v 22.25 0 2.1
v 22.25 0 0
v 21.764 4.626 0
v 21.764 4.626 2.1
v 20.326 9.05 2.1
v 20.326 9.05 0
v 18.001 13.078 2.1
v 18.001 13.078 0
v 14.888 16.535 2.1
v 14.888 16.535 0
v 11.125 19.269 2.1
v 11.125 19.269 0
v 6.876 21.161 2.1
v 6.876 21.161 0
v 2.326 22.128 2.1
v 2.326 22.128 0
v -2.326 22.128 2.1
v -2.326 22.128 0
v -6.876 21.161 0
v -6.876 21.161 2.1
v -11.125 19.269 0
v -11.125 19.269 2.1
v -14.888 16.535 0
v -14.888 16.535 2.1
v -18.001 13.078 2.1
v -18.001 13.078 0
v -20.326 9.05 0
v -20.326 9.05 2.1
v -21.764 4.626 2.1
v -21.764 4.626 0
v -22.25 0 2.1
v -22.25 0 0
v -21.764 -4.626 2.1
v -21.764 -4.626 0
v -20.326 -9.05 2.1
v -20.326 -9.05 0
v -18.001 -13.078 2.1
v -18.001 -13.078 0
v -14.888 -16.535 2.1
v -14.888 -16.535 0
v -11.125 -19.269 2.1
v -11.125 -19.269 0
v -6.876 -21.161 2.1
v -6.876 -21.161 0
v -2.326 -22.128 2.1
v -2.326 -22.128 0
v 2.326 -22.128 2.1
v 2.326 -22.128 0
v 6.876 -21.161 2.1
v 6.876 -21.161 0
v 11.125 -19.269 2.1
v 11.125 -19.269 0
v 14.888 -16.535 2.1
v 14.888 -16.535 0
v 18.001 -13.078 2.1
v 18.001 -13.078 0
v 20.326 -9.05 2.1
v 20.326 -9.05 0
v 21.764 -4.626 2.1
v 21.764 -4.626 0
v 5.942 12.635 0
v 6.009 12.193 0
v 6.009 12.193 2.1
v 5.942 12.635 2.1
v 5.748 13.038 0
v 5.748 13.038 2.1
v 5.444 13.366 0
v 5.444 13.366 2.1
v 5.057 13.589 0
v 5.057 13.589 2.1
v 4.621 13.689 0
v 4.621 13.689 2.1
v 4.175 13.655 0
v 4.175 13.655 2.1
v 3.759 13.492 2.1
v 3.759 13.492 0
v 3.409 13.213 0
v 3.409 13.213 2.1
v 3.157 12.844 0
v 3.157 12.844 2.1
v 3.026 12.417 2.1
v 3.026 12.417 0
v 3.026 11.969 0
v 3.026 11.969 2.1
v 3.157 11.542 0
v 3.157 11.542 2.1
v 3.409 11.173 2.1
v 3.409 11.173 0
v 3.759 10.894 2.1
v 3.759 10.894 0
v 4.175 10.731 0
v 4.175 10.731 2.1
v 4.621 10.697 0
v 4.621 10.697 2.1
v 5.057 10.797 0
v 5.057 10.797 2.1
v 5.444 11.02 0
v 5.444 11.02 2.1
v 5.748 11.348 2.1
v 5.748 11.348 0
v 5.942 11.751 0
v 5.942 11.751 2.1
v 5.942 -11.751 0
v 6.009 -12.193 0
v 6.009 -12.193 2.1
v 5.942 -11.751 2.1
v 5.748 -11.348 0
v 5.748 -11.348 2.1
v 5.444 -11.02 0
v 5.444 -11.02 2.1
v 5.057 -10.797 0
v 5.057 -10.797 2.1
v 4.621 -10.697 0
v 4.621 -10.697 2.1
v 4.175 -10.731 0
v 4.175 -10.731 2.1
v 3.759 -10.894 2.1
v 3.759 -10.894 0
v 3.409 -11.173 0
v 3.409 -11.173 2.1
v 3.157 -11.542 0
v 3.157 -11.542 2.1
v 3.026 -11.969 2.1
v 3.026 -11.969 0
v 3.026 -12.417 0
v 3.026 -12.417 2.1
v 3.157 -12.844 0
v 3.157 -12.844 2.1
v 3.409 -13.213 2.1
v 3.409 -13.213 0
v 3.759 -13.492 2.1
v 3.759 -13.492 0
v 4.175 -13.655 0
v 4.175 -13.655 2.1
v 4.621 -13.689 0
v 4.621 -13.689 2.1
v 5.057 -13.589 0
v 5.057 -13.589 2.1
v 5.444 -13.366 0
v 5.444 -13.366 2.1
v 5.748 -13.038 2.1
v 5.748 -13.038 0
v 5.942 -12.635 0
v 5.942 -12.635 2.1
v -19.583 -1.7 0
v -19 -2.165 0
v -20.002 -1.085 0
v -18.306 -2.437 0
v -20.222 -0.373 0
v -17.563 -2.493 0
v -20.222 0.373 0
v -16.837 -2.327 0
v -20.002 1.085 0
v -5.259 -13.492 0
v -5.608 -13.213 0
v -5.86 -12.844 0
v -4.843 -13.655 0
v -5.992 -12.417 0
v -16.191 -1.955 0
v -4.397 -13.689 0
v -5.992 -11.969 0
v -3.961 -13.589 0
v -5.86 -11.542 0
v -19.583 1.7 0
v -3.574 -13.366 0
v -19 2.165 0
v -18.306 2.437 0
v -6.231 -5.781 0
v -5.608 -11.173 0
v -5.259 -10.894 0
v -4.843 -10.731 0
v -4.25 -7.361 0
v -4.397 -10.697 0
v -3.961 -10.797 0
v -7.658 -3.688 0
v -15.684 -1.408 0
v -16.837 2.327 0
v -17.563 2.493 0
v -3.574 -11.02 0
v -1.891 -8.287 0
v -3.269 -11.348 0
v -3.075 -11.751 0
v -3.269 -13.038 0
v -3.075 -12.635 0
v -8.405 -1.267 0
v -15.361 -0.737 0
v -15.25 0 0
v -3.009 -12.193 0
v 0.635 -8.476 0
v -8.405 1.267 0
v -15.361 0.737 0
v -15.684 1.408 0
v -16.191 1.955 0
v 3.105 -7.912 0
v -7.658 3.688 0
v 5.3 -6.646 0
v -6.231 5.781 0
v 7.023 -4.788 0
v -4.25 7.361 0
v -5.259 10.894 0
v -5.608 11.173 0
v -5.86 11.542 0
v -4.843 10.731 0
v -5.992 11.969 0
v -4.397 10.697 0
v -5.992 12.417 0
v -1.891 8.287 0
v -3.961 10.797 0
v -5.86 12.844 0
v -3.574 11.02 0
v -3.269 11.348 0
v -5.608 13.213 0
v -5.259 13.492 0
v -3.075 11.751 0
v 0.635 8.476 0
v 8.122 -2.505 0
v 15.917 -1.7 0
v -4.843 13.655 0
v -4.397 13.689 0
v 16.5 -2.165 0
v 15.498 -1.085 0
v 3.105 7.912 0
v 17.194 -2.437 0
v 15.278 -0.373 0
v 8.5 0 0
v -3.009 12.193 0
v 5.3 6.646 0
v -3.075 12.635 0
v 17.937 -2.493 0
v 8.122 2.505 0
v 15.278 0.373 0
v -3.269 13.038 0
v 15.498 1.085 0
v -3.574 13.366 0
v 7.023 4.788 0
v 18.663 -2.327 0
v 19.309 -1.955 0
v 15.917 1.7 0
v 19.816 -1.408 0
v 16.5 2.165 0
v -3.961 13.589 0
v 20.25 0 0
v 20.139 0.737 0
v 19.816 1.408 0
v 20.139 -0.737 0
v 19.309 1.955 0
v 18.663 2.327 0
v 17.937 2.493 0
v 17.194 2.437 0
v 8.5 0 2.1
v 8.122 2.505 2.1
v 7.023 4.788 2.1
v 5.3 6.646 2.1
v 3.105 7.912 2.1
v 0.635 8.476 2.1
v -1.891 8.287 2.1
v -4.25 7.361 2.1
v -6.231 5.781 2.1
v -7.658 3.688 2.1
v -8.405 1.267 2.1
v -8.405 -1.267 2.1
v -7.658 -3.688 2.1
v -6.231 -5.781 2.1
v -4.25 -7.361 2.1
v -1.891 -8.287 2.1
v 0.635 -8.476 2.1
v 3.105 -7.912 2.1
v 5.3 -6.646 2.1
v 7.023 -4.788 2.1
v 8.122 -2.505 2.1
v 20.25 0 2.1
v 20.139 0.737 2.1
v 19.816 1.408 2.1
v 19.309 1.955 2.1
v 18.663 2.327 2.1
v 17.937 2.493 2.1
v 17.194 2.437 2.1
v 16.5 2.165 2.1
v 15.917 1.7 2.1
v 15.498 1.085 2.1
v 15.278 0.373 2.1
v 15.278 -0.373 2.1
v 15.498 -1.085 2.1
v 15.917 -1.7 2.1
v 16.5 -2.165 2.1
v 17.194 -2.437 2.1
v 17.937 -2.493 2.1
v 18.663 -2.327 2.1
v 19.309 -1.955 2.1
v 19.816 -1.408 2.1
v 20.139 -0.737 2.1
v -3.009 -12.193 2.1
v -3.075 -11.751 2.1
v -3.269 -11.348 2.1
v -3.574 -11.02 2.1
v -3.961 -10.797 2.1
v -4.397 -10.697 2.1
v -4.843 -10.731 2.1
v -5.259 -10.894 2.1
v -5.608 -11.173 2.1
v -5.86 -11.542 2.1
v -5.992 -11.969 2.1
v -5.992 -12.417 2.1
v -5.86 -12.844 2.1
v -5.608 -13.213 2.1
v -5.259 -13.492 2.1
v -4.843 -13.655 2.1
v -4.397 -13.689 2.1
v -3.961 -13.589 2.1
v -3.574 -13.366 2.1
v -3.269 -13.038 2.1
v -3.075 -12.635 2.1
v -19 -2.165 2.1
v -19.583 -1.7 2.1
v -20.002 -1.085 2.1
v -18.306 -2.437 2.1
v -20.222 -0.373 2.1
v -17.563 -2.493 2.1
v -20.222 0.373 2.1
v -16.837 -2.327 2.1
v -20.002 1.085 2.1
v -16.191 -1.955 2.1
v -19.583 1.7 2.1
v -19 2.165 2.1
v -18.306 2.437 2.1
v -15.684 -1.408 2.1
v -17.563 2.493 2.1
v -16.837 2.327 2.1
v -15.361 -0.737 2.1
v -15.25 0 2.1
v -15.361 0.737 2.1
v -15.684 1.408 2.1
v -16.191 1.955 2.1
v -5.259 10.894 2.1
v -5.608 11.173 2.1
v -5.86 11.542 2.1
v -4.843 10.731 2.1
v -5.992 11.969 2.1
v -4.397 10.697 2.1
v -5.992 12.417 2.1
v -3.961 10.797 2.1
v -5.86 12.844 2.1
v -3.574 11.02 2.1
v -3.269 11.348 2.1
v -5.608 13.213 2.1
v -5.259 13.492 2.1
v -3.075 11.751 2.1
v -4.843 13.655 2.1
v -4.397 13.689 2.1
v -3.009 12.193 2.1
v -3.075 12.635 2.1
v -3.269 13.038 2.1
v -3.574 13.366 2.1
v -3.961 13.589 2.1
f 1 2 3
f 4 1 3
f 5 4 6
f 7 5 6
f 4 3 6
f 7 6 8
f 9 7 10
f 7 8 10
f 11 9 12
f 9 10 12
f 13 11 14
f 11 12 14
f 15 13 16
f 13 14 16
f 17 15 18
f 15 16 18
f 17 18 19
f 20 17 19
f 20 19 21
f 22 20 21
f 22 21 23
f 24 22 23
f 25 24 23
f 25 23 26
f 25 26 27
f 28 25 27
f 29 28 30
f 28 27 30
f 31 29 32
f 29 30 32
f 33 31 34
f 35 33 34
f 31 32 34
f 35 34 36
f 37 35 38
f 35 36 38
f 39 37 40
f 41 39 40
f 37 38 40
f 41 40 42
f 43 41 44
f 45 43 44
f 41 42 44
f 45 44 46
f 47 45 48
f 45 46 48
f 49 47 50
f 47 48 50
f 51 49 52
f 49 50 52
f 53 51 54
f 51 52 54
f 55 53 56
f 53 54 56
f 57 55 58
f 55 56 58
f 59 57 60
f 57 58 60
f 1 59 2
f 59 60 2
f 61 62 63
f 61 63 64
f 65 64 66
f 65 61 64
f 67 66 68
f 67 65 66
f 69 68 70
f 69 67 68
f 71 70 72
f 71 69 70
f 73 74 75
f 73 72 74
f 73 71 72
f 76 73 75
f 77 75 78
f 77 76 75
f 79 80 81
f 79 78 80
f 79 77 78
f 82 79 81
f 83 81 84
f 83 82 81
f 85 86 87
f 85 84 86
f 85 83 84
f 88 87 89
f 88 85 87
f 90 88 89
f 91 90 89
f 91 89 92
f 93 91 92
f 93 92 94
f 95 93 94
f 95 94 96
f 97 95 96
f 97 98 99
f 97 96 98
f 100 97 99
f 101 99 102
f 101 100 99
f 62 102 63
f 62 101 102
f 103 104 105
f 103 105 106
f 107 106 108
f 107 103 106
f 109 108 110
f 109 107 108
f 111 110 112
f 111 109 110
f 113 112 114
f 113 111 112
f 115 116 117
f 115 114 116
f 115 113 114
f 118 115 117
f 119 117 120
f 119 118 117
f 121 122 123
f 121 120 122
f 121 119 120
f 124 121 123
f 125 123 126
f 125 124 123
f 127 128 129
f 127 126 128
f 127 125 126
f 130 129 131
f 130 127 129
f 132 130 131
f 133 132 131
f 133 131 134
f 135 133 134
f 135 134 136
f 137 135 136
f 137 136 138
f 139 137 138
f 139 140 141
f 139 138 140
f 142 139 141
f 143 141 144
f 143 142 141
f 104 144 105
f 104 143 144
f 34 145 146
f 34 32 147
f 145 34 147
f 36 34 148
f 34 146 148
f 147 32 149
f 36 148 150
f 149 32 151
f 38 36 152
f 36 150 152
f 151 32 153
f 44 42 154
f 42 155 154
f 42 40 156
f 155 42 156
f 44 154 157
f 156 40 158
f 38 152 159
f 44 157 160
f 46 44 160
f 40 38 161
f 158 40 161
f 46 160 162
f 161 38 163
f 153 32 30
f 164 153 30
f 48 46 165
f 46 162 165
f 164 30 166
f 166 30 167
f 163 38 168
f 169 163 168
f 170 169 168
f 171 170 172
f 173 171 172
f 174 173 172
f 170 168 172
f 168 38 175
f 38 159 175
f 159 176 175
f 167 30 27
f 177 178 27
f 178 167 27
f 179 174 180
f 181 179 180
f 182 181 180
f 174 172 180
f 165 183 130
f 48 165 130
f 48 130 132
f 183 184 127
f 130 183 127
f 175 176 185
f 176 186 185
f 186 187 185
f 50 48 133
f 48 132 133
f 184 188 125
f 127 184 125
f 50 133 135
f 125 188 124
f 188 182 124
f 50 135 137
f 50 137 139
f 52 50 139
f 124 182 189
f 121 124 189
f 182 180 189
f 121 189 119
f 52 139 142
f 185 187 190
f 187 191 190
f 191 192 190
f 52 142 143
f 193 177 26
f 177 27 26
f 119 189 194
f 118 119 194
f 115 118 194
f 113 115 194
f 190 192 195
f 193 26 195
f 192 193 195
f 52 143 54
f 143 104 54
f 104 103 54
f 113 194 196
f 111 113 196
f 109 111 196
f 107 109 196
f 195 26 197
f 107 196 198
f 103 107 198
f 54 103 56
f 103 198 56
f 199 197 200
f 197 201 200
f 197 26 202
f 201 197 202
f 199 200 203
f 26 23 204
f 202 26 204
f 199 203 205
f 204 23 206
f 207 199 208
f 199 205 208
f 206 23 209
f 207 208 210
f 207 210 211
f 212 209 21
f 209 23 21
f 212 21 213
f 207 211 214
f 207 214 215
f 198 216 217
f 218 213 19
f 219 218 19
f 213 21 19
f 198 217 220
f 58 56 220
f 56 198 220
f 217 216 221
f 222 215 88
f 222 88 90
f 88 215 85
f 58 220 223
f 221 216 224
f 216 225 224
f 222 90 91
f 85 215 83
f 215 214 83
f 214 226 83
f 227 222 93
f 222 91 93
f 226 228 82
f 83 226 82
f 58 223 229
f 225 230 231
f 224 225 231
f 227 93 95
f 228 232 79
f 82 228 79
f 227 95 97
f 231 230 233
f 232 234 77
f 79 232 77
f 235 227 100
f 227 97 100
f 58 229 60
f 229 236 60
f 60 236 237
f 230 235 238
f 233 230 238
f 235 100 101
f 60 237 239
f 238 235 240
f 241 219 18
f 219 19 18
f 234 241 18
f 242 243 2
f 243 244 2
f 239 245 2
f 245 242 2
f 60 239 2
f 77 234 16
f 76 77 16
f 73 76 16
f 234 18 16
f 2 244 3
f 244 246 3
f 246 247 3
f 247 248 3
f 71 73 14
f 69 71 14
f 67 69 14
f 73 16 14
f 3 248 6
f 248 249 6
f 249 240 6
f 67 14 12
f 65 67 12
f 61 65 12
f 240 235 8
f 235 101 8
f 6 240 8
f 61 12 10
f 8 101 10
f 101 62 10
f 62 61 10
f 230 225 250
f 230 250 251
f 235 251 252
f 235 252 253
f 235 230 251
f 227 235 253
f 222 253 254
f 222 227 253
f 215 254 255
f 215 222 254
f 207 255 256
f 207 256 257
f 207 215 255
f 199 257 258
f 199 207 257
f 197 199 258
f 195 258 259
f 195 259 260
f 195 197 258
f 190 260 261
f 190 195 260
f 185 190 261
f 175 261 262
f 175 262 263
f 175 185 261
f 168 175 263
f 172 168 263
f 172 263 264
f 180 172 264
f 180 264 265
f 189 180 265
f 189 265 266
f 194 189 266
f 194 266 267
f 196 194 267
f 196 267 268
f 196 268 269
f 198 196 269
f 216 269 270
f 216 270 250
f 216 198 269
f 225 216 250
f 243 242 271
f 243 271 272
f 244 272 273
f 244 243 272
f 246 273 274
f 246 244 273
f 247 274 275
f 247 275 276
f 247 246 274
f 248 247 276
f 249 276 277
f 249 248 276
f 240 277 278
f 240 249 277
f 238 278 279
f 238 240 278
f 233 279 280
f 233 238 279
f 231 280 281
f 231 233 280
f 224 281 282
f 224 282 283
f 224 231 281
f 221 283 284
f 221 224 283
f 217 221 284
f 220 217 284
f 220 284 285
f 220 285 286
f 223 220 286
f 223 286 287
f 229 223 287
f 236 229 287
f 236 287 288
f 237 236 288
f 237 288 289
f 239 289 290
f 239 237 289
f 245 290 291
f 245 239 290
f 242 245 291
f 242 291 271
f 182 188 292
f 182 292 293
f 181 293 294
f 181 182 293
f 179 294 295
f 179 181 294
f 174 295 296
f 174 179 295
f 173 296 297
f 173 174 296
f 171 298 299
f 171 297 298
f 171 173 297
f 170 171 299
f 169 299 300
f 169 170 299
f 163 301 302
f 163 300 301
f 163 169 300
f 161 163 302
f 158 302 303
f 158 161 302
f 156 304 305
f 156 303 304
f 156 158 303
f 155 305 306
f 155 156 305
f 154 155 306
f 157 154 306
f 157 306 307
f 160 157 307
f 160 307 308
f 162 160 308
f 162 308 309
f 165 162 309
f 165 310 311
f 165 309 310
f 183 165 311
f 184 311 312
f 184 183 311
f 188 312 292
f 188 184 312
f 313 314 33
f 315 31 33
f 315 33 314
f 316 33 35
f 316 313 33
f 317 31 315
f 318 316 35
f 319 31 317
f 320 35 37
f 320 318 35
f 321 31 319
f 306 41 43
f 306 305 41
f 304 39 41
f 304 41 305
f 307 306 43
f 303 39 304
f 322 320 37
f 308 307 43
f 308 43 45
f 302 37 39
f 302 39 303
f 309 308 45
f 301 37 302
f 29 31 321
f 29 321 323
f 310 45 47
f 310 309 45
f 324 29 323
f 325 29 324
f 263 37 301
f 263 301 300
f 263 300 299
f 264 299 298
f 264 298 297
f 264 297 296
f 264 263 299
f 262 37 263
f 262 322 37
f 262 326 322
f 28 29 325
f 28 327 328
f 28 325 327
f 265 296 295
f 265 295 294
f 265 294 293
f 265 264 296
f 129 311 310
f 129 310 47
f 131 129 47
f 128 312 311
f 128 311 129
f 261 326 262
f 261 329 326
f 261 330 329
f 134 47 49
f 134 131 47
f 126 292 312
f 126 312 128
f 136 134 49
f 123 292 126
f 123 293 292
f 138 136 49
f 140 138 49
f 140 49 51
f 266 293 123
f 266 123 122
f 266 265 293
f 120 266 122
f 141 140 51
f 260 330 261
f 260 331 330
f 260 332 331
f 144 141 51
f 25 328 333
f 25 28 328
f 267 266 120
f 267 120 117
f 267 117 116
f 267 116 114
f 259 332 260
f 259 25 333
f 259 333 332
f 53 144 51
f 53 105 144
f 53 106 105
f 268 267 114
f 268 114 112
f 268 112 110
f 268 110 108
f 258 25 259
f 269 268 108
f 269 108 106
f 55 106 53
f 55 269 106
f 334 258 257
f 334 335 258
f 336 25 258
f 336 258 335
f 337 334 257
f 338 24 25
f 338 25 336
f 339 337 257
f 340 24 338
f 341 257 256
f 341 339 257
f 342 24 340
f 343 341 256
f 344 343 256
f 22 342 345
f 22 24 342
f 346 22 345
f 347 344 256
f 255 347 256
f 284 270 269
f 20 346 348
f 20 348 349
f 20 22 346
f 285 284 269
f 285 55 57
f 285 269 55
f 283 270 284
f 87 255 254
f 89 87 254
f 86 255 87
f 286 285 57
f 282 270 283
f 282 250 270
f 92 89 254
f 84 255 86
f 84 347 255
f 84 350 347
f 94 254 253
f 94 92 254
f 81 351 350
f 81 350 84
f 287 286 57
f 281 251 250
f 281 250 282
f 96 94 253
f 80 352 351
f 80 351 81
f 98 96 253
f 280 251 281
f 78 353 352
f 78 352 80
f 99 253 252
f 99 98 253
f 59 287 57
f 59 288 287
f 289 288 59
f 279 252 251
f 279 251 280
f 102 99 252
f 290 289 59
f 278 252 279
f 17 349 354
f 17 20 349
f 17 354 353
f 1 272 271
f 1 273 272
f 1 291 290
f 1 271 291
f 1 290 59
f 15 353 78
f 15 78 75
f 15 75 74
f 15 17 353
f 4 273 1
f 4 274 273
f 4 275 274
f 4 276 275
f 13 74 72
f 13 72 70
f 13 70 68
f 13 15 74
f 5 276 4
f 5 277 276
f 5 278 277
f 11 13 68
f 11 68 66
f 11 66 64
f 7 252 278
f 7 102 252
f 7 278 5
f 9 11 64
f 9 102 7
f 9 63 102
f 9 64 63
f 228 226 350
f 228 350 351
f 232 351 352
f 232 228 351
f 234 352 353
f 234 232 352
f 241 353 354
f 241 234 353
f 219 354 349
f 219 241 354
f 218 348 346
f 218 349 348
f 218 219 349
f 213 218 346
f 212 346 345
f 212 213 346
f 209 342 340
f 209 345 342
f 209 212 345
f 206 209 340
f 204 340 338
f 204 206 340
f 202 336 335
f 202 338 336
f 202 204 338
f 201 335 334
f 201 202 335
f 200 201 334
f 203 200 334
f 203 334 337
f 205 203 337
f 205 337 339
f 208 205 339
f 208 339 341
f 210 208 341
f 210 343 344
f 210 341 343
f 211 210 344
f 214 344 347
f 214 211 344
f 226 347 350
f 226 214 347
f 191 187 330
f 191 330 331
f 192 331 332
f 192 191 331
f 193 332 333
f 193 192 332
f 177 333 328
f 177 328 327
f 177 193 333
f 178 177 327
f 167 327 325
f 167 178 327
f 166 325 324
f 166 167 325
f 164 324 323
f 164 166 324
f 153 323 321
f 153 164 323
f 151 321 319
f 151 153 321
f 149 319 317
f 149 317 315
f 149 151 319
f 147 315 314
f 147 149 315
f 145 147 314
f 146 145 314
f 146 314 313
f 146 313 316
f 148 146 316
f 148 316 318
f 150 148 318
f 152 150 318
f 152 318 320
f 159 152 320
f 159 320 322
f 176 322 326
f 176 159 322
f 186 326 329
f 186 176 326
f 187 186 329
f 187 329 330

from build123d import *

# Parameters (mm, degrees)
SKETCH1_R               = 22.25
SKETCH1_R_2             = 8.5
SKETCH1_R_3             = 2.5
BOSS_EXTRUDE1_DEPTH     = 2.1
CUT_EXTRUDE2_DEPTH      = 32.536248984
CUT_EXTRUDE2_DEPTH_BACK = 32.536248984
SKETCH3_R               = 1.5


with BuildPart() as part:
    # Sketch1 → Boss-Extrude1 (new body)
    with BuildSketch(Plane.XY):
        Circle(SKETCH1_R)
        Circle(SKETCH1_R_2, mode=Mode.SUBTRACT)
        with Locations((17.75, 0)):
            Circle(SKETCH1_R_3, mode=Mode.SUBTRACT)
        with Locations((-17.75, 0)):
            Circle(SKETCH1_R_3, mode=Mode.SUBTRACT)
    extrude(amount=BOSS_EXTRUDE1_DEPTH)

    # Sketch3 → Cut-Extrude2 (cut, two sides: drawn at the far end of the back side and taken through both)
    with BuildSketch(Plane.XY.offset(-CUT_EXTRUDE2_DEPTH_BACK)):
        with Locations((4.508802817, -12.193059385)):
            Circle(SKETCH3_R)
        with Locations((4.508802817, 12.193059385)):
            Circle(SKETCH3_R)
        with Locations((-4.508802817, -12.193059385)):
            Circle(SKETCH3_R)
        with Locations((-4.508802817, 12.193059385)):
            Circle(SKETCH3_R)
    extrude(amount=CUT_EXTRUDE2_DEPTH + CUT_EXTRUDE2_DEPTH_BACK, mode=Mode.SUBTRACT)


solid = part.part
